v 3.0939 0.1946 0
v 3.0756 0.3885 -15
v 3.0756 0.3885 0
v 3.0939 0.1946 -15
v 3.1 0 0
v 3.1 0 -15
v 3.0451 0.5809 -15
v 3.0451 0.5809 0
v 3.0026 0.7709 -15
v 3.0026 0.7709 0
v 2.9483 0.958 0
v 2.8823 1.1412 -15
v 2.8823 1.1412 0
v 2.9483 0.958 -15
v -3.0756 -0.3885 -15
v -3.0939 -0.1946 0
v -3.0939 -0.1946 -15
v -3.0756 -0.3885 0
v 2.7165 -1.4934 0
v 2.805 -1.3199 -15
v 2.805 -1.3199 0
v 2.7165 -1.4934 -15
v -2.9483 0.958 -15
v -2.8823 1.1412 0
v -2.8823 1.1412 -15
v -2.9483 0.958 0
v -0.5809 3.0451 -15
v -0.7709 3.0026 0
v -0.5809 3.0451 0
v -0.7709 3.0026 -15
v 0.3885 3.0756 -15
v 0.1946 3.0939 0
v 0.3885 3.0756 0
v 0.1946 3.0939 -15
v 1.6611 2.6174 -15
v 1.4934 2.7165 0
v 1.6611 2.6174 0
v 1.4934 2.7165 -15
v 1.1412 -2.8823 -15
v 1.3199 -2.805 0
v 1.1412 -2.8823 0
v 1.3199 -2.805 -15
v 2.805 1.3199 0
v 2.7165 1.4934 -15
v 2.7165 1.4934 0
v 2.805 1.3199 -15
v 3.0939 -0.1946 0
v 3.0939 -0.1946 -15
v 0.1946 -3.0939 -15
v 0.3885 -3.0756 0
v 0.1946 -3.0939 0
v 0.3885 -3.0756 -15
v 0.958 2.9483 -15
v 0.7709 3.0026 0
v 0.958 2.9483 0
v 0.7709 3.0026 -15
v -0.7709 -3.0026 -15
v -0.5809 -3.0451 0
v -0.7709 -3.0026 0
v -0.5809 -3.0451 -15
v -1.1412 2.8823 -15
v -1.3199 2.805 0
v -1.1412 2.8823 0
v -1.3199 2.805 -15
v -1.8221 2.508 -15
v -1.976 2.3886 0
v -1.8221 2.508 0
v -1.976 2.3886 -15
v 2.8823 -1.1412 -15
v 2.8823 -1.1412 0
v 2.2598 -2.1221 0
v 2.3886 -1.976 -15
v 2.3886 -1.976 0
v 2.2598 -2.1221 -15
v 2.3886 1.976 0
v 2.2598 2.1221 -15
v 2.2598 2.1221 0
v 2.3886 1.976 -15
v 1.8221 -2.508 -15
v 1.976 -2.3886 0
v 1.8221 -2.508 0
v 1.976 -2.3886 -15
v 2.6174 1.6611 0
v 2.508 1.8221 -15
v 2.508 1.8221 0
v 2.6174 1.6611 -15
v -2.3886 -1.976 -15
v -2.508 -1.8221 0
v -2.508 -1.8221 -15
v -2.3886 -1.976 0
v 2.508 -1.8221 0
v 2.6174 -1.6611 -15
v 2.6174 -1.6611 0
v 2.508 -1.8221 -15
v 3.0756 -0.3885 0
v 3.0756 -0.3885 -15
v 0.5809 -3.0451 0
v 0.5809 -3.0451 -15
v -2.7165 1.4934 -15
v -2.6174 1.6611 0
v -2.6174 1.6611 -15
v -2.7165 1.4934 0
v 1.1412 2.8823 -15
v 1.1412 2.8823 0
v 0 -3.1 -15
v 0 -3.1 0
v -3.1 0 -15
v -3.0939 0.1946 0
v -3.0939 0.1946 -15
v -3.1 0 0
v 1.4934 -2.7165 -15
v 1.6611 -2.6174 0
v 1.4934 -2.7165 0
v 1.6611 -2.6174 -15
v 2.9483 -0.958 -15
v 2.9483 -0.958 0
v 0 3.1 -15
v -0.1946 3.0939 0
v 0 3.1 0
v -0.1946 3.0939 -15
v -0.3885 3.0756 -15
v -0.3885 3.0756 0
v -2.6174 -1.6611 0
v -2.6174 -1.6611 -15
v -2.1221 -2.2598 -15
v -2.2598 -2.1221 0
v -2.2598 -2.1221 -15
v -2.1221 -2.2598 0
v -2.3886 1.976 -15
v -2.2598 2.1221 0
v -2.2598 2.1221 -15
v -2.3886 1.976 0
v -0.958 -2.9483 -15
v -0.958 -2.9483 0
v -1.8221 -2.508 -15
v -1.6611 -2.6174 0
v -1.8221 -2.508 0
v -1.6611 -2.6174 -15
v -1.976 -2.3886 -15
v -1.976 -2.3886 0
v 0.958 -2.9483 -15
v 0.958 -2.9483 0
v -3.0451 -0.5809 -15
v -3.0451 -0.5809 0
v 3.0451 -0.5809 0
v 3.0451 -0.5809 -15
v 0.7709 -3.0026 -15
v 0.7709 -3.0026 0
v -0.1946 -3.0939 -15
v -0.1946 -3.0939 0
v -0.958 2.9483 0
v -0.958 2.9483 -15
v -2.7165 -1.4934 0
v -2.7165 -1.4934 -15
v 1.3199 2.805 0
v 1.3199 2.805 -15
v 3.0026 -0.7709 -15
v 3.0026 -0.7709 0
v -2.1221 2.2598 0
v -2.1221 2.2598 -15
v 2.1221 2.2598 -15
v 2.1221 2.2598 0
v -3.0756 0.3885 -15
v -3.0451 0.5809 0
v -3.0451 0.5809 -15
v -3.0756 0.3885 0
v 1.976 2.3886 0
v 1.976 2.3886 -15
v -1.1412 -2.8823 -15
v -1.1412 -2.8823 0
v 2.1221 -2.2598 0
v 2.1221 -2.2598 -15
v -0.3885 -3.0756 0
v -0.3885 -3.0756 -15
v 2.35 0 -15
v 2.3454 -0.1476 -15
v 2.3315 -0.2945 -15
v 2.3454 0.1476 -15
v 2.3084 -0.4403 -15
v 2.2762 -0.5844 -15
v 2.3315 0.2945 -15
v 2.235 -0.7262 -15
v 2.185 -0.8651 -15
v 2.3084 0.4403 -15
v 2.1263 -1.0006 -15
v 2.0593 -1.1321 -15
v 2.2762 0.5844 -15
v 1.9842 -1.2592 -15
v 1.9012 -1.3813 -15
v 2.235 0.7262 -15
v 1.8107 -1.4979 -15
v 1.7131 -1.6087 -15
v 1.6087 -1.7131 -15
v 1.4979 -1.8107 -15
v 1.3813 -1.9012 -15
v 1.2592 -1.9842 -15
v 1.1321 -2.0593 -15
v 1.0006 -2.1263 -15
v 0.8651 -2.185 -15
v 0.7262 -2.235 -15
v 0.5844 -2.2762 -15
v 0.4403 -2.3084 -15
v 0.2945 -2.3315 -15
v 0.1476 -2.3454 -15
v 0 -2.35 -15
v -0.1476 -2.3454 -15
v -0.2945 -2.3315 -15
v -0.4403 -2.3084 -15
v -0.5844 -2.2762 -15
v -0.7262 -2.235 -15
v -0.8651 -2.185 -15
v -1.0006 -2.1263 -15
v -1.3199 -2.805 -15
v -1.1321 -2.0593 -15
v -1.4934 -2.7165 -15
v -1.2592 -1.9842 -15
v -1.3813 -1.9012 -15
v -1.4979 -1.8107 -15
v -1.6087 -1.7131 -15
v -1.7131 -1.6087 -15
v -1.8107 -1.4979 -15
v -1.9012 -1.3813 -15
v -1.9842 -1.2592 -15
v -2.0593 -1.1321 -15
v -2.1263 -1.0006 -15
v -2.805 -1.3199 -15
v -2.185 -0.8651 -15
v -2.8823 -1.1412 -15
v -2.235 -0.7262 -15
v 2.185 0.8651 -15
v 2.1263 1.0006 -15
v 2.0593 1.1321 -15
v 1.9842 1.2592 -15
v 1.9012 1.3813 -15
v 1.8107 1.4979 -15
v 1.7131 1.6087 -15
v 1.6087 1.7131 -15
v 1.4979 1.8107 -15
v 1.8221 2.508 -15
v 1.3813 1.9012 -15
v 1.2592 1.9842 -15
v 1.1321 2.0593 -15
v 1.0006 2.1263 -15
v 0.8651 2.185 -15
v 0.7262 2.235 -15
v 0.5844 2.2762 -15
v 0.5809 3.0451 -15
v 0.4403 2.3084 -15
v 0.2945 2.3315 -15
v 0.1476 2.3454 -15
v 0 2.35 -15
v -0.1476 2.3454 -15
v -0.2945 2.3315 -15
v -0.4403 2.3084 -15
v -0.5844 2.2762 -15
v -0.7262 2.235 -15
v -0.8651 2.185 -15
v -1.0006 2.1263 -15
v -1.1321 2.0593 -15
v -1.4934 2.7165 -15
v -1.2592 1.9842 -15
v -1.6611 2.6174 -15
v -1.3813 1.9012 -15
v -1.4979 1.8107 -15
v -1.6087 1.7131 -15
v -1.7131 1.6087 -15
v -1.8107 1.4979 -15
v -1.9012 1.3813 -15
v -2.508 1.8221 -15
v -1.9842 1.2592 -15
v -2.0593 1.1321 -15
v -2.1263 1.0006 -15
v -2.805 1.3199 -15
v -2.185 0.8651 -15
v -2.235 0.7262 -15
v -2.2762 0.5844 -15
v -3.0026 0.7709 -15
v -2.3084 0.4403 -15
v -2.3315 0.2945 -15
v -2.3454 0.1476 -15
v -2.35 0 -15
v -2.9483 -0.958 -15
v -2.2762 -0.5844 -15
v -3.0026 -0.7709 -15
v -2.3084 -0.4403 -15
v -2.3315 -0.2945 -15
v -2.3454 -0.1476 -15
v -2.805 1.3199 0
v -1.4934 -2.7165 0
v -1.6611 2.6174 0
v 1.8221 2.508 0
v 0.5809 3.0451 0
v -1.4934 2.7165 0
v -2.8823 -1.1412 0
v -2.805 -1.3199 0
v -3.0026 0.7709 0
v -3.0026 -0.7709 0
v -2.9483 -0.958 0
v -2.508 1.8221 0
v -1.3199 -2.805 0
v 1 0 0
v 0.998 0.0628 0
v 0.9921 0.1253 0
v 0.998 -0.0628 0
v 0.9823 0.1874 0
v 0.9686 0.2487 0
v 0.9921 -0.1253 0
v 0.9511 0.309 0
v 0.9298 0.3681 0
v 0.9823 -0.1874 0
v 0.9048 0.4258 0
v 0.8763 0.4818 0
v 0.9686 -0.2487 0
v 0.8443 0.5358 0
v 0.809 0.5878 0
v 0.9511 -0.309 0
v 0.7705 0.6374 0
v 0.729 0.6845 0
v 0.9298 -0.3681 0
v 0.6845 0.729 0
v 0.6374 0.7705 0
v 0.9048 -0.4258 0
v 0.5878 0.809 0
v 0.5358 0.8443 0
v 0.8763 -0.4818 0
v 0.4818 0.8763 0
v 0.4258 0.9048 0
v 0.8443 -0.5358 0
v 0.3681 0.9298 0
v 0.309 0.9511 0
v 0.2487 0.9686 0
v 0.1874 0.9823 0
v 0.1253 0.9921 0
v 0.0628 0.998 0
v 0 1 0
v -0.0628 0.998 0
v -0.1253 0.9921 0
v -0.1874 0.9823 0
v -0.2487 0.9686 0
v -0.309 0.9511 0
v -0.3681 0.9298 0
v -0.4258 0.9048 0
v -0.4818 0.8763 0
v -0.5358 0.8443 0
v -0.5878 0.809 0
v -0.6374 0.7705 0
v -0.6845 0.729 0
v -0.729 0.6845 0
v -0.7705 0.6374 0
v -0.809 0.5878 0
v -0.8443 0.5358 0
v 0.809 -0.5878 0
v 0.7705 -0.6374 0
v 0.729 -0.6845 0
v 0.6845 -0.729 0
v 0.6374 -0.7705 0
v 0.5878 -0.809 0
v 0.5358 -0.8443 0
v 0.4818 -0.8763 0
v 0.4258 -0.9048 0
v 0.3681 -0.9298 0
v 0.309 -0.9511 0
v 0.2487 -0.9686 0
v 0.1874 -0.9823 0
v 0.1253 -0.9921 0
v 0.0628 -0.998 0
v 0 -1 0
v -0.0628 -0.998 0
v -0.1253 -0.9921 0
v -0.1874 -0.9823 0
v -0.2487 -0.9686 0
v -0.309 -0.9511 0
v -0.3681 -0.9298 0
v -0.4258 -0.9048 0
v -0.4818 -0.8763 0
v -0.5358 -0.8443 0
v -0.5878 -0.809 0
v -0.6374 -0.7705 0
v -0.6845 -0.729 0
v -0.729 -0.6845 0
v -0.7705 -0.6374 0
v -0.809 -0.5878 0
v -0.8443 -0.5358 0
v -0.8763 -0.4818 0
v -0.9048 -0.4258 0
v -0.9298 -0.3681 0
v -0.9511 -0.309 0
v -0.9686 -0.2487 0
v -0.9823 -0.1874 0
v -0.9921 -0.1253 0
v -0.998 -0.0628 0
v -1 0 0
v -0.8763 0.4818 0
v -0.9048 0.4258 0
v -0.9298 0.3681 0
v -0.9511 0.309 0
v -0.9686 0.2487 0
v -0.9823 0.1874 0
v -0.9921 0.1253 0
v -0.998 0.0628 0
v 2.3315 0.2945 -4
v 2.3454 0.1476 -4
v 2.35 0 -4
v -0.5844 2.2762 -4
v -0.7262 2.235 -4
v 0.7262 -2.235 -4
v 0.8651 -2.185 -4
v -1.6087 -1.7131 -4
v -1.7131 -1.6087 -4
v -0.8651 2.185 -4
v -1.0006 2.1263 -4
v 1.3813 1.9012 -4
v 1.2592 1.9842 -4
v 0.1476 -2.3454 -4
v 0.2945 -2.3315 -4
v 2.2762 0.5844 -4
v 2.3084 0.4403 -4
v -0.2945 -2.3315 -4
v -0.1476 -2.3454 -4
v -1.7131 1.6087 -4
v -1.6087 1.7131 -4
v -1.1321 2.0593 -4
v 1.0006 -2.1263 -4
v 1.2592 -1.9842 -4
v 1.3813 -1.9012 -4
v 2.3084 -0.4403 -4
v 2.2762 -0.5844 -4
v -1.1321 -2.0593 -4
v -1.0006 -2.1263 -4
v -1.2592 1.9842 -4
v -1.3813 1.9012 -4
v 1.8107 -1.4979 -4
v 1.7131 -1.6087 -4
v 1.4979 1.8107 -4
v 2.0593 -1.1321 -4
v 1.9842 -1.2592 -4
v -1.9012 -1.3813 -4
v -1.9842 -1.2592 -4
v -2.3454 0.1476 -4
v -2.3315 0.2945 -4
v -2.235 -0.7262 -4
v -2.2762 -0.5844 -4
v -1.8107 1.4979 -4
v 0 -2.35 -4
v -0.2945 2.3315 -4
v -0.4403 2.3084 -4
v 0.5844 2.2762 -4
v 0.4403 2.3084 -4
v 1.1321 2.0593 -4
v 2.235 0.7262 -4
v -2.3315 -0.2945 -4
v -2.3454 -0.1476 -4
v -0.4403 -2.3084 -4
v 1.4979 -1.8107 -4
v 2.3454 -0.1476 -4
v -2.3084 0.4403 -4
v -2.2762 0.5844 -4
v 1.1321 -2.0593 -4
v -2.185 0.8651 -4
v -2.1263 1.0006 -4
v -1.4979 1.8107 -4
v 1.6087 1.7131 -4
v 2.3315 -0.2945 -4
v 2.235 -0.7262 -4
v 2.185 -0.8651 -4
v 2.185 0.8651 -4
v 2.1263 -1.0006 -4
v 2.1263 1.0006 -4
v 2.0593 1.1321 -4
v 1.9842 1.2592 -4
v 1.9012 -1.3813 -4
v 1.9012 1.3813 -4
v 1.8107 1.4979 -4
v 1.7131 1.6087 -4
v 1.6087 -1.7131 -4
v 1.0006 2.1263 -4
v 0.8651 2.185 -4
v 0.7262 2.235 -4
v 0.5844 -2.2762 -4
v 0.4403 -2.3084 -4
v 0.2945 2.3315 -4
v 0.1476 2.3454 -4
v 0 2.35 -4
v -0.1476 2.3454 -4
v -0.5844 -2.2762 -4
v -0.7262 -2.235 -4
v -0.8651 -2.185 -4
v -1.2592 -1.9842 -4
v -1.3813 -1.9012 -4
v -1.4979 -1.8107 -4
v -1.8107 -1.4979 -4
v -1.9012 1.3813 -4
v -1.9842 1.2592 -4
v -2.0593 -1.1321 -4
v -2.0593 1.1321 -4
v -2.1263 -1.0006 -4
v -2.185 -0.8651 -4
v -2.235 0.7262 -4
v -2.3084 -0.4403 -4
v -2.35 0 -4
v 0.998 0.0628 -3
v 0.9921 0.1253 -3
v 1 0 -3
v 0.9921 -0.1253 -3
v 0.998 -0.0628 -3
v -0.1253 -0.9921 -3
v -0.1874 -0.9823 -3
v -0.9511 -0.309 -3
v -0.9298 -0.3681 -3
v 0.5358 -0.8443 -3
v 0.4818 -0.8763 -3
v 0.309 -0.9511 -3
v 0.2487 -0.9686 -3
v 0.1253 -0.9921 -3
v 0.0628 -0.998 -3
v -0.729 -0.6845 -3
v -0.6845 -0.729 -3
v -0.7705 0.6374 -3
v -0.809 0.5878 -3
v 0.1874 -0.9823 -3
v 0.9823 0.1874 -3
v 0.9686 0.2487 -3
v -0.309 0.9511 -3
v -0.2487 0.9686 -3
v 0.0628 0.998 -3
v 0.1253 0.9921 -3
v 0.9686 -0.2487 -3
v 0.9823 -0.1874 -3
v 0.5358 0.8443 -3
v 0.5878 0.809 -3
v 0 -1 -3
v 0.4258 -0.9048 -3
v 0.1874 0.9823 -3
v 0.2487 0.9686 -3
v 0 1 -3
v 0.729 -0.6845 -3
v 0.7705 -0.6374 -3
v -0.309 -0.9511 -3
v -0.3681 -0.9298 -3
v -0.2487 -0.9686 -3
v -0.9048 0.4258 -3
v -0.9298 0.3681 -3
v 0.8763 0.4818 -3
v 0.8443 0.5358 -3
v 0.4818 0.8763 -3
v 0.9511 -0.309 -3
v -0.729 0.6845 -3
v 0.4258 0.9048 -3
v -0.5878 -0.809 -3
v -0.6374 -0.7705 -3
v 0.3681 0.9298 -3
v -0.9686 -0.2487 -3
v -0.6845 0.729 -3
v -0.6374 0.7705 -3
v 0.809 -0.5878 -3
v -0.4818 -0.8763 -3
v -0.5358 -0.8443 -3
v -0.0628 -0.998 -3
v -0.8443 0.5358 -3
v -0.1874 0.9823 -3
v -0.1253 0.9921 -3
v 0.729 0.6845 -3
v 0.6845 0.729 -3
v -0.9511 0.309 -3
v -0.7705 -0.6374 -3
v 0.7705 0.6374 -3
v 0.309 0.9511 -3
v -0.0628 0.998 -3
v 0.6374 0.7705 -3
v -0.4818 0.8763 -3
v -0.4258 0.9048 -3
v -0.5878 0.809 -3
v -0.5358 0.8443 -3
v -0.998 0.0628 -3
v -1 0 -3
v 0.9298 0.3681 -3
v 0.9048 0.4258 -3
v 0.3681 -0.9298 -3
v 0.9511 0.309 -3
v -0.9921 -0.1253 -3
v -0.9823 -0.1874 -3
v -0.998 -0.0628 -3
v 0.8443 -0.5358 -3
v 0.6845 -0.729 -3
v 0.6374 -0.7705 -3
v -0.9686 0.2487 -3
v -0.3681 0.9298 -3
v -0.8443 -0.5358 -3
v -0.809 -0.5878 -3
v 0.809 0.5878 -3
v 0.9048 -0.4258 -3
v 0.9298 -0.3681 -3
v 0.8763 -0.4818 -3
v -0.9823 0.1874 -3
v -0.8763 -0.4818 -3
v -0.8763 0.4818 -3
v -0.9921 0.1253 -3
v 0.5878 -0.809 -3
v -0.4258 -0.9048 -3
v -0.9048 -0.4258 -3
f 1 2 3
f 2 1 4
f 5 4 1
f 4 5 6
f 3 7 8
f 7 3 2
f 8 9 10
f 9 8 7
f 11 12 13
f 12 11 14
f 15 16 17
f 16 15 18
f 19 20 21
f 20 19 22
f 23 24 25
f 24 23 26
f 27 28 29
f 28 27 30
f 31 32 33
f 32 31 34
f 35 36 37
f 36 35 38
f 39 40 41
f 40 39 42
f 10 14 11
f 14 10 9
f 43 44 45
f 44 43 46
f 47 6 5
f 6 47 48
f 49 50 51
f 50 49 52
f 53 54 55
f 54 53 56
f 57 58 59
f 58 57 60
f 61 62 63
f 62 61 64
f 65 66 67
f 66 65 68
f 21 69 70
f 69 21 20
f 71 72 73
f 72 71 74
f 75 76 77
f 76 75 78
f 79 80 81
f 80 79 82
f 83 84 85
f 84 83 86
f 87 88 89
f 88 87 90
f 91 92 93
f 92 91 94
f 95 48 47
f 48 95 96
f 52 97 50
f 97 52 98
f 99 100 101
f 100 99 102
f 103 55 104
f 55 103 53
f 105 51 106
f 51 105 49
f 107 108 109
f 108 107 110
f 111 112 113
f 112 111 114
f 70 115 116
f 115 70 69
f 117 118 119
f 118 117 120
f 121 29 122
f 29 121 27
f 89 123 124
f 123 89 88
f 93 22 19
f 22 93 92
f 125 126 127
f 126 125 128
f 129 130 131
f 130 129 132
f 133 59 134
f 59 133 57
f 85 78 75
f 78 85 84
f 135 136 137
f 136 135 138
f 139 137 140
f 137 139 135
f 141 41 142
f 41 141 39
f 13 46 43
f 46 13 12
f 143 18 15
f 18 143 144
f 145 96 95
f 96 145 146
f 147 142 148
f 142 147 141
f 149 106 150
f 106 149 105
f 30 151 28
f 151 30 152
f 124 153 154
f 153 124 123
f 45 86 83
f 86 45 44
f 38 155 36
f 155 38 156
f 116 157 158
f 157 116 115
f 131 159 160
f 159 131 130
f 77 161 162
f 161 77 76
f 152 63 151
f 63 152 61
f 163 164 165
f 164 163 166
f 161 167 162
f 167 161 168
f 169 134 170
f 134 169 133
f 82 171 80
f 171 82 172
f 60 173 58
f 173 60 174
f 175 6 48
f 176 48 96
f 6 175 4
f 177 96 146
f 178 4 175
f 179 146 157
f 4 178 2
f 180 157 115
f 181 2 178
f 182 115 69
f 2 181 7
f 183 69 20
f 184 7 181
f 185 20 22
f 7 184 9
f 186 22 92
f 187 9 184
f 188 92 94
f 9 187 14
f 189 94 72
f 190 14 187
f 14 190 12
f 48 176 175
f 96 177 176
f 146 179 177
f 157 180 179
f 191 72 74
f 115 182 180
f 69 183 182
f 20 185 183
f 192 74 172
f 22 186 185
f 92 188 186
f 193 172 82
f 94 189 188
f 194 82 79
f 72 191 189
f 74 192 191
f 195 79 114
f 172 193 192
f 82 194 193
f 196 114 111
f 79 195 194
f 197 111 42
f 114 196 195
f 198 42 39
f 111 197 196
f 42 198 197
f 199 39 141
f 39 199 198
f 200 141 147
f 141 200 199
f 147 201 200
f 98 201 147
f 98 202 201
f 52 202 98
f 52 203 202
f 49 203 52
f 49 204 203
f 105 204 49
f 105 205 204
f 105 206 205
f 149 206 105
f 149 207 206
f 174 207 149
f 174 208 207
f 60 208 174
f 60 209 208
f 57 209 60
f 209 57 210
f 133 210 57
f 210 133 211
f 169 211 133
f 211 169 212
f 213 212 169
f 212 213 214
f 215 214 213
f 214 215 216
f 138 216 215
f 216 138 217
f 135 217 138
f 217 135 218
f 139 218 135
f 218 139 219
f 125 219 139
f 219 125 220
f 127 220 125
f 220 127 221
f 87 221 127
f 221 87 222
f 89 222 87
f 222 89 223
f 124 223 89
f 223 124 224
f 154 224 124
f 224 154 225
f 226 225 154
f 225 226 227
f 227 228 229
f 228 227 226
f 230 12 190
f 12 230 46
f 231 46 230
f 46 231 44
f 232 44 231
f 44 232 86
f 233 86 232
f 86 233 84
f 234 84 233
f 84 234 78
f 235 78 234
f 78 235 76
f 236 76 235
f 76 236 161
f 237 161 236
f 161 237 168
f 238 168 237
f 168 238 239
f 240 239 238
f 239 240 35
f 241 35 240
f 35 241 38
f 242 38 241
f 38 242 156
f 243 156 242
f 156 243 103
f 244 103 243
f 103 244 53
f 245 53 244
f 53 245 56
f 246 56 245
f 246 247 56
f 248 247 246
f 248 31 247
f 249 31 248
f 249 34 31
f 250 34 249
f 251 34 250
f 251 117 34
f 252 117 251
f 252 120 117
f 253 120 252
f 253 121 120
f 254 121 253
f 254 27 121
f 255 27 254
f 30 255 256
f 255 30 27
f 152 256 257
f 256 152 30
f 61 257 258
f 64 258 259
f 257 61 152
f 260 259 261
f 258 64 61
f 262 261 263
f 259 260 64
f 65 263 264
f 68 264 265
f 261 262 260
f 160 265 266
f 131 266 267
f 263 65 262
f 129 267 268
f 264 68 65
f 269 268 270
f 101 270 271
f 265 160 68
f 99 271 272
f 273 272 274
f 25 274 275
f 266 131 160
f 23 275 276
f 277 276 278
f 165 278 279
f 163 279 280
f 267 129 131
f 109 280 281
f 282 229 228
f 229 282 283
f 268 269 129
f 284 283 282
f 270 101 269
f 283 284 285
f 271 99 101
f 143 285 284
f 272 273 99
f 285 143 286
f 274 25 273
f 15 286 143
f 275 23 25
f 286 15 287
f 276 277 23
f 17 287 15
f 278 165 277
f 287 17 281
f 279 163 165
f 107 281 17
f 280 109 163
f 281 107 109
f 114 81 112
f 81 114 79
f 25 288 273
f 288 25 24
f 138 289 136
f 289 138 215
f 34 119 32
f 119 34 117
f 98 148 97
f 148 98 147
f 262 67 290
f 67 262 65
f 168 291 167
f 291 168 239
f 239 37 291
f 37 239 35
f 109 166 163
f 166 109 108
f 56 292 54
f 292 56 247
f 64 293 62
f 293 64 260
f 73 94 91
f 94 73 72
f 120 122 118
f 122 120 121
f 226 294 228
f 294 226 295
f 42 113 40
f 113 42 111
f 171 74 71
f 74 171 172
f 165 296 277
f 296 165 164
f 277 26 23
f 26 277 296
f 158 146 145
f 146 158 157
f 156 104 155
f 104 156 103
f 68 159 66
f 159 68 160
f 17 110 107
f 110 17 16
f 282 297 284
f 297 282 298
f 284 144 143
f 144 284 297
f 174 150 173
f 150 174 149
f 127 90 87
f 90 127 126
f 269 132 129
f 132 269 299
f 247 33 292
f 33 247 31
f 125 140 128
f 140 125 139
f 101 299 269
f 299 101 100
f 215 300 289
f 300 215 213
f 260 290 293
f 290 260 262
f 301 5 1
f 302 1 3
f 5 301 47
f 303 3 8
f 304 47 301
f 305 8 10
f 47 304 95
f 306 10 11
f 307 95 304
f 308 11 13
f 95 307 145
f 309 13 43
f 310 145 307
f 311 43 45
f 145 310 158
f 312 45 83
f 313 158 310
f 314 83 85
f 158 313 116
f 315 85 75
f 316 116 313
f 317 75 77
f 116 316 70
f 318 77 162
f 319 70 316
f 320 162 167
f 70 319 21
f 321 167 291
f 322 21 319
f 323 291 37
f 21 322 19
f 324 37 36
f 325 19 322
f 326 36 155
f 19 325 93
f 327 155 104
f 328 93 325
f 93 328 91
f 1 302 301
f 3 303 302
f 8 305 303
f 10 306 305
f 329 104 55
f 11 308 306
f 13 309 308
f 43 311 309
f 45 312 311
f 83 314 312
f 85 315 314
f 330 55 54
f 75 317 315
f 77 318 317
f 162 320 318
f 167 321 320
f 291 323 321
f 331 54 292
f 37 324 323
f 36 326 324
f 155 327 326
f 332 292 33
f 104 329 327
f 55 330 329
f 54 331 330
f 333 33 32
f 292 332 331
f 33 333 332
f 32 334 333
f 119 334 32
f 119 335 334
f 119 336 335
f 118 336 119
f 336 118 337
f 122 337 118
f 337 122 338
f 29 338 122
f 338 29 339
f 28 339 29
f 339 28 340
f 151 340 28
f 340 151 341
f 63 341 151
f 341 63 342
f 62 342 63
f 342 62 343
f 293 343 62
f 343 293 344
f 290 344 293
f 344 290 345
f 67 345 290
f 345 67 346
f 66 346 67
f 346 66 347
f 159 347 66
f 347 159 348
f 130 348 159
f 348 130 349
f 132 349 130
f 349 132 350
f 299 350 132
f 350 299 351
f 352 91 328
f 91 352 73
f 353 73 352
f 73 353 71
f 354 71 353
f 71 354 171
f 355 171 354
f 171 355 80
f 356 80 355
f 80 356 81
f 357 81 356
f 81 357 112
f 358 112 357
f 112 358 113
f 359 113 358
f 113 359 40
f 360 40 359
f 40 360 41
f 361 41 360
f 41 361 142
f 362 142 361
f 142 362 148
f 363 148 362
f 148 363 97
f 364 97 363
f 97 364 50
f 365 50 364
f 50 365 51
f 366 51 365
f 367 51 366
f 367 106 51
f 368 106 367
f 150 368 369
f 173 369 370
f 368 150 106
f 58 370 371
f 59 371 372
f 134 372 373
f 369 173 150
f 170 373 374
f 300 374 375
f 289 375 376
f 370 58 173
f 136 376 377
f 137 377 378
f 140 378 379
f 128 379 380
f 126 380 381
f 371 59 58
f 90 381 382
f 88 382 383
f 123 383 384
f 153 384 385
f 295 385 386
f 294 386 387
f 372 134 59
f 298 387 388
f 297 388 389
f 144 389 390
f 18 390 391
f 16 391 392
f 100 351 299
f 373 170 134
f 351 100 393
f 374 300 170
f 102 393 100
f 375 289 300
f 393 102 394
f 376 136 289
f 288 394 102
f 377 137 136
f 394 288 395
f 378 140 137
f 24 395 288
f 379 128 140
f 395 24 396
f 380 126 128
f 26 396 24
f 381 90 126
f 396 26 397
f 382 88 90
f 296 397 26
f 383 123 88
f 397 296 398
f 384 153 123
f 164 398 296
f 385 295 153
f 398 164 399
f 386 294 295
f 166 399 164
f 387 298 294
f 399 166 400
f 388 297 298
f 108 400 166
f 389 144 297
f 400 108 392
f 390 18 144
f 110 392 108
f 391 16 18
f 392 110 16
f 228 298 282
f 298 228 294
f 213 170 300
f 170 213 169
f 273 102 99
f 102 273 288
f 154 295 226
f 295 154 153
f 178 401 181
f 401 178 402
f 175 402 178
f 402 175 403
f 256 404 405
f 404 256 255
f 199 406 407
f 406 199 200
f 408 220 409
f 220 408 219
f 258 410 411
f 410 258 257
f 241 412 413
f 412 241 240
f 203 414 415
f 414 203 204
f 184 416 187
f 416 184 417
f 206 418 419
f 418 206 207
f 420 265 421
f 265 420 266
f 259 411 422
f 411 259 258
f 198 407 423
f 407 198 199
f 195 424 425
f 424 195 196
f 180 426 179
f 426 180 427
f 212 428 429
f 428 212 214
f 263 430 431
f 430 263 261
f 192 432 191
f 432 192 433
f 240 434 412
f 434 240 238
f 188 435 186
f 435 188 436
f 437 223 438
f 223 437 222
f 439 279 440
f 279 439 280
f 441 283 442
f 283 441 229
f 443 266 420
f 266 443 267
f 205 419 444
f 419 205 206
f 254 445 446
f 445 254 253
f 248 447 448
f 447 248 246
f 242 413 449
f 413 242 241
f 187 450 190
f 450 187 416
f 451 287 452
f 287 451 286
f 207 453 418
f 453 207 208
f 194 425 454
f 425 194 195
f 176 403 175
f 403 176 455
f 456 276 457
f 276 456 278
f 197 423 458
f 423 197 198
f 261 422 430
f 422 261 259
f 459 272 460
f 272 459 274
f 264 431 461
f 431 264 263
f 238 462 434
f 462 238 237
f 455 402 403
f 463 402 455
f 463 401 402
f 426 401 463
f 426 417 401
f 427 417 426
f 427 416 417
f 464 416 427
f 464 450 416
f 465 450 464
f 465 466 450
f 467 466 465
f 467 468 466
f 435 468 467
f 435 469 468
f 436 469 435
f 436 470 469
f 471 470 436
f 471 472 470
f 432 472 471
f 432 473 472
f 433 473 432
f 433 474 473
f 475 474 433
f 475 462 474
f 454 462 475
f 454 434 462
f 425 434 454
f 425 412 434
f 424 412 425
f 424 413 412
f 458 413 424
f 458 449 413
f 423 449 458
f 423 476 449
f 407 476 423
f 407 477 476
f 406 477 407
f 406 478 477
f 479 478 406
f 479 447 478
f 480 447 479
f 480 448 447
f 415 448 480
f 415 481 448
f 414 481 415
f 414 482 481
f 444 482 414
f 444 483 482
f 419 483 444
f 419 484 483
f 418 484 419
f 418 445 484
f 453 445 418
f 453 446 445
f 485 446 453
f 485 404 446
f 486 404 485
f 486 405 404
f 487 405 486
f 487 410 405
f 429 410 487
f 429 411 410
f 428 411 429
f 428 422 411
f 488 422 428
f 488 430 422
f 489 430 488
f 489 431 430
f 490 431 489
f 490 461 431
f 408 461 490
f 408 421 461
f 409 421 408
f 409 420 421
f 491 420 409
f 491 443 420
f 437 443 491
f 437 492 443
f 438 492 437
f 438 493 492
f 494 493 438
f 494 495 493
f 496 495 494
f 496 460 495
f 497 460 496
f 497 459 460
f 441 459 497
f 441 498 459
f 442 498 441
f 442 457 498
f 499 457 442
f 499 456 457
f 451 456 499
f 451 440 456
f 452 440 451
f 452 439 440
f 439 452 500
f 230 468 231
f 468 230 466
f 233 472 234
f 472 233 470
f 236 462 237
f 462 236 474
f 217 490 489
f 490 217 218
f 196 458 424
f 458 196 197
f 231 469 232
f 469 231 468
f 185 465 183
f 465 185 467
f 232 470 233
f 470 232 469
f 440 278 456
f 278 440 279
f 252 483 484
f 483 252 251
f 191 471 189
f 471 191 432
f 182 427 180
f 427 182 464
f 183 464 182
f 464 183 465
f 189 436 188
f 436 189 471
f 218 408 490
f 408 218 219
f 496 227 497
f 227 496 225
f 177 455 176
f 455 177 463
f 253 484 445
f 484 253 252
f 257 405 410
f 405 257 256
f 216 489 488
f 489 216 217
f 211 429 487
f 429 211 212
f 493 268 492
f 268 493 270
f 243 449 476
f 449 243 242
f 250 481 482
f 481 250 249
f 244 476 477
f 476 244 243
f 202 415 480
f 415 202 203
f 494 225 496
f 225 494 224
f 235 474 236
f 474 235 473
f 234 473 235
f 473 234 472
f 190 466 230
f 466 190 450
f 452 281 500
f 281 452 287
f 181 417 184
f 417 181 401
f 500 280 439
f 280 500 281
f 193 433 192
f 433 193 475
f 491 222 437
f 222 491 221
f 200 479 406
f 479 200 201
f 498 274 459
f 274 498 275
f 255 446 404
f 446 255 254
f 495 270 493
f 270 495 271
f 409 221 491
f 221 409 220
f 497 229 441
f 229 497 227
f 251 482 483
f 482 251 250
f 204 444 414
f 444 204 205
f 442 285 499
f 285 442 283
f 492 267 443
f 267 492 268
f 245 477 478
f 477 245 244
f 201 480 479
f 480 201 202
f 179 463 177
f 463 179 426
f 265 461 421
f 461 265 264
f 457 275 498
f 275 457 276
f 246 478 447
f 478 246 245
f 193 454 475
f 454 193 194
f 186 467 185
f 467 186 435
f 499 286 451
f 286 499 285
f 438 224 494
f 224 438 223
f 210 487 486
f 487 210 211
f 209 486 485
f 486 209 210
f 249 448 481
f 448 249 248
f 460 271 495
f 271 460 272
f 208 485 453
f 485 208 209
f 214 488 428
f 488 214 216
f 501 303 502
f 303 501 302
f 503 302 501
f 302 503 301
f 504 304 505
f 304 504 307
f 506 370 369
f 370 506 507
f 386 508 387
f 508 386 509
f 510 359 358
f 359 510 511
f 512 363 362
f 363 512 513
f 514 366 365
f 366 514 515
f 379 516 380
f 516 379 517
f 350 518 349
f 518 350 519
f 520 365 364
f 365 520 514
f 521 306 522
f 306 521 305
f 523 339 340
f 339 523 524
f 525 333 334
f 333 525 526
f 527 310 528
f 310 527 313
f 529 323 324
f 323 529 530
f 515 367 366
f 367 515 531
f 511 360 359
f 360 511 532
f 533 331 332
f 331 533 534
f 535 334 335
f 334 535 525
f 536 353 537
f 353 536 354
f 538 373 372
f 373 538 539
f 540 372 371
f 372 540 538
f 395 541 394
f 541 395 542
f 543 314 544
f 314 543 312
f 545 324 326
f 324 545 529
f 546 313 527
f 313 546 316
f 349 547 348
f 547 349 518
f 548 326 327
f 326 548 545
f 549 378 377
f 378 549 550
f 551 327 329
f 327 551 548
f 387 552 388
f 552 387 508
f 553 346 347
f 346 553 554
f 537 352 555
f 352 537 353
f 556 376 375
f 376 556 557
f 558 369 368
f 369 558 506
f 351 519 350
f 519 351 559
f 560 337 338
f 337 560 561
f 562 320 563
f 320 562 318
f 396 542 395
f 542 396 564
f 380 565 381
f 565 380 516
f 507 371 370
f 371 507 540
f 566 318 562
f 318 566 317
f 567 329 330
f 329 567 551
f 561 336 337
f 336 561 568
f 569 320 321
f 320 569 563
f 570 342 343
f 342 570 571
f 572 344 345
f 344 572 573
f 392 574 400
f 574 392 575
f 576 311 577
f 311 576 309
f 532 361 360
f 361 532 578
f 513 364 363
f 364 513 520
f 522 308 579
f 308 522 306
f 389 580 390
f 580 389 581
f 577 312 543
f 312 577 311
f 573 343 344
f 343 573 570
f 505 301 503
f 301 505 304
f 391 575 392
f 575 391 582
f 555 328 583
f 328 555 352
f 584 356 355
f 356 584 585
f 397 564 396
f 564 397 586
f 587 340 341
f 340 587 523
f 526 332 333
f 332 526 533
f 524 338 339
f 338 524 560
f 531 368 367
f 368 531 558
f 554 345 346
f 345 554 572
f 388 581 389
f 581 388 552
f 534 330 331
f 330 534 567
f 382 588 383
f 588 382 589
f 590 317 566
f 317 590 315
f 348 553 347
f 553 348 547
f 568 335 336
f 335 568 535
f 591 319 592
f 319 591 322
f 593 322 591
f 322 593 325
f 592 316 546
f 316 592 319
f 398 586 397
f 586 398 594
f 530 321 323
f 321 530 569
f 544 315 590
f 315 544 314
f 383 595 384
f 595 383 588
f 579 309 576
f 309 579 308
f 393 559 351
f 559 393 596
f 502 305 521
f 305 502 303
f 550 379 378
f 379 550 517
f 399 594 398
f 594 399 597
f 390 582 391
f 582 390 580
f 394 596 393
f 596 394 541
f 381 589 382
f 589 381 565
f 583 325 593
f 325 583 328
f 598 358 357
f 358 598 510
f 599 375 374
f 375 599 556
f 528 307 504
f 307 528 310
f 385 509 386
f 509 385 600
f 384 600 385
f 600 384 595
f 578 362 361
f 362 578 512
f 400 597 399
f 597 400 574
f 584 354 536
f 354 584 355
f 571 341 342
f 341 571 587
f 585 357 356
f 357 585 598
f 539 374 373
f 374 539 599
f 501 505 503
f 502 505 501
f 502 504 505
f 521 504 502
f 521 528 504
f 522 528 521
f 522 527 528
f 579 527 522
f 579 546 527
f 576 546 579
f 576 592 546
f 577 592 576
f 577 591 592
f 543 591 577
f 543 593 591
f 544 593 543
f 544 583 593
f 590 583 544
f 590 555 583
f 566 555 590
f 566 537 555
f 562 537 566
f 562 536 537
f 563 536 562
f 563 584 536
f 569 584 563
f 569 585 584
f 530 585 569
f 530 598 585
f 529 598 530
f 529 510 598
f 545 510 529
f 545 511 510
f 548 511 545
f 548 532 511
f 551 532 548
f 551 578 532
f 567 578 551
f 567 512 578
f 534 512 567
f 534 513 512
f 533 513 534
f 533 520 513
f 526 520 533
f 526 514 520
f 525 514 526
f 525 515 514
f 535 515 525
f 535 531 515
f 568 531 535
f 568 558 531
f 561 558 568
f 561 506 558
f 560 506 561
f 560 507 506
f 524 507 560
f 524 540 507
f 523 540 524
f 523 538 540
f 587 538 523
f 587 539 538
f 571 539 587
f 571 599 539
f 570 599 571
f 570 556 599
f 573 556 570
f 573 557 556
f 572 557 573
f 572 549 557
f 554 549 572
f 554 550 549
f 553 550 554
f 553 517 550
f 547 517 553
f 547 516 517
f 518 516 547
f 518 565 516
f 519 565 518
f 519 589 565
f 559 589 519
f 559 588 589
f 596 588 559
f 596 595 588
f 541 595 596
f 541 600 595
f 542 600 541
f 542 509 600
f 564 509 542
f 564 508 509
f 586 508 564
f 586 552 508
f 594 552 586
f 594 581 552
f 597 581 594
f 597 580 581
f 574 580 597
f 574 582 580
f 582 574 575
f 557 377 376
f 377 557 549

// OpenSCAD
// file: bottom_pin.scad
// This is the bottom pin which is used to mount the sample holders into the machines.
// Since we use this for most of our models, it makes sense to have a small 'template' which we can just add the model where it's needed...
// To do so, add a line with "use<bottom_pin.scad>"
// And then just call "pin();" wherever you need the pin :)
$fn=100;
module pin(diameter=6.2, height=10, cap_depth=1)
{
    translate([0,0,-height]) difference(){
        cylinder(d=diameter,h=height);
        cylinder(d=diameter-1.5,h=height-cap_depth);
    }
}
pin();
// main file
// Good for putting something very small on top of a needle into the scanner
$fn=100;

use <bottom_pin.scad>

difference(){
	pin(height=15, cap_depth=4);
    cylinder(d=2, h=6, center=true);
}
